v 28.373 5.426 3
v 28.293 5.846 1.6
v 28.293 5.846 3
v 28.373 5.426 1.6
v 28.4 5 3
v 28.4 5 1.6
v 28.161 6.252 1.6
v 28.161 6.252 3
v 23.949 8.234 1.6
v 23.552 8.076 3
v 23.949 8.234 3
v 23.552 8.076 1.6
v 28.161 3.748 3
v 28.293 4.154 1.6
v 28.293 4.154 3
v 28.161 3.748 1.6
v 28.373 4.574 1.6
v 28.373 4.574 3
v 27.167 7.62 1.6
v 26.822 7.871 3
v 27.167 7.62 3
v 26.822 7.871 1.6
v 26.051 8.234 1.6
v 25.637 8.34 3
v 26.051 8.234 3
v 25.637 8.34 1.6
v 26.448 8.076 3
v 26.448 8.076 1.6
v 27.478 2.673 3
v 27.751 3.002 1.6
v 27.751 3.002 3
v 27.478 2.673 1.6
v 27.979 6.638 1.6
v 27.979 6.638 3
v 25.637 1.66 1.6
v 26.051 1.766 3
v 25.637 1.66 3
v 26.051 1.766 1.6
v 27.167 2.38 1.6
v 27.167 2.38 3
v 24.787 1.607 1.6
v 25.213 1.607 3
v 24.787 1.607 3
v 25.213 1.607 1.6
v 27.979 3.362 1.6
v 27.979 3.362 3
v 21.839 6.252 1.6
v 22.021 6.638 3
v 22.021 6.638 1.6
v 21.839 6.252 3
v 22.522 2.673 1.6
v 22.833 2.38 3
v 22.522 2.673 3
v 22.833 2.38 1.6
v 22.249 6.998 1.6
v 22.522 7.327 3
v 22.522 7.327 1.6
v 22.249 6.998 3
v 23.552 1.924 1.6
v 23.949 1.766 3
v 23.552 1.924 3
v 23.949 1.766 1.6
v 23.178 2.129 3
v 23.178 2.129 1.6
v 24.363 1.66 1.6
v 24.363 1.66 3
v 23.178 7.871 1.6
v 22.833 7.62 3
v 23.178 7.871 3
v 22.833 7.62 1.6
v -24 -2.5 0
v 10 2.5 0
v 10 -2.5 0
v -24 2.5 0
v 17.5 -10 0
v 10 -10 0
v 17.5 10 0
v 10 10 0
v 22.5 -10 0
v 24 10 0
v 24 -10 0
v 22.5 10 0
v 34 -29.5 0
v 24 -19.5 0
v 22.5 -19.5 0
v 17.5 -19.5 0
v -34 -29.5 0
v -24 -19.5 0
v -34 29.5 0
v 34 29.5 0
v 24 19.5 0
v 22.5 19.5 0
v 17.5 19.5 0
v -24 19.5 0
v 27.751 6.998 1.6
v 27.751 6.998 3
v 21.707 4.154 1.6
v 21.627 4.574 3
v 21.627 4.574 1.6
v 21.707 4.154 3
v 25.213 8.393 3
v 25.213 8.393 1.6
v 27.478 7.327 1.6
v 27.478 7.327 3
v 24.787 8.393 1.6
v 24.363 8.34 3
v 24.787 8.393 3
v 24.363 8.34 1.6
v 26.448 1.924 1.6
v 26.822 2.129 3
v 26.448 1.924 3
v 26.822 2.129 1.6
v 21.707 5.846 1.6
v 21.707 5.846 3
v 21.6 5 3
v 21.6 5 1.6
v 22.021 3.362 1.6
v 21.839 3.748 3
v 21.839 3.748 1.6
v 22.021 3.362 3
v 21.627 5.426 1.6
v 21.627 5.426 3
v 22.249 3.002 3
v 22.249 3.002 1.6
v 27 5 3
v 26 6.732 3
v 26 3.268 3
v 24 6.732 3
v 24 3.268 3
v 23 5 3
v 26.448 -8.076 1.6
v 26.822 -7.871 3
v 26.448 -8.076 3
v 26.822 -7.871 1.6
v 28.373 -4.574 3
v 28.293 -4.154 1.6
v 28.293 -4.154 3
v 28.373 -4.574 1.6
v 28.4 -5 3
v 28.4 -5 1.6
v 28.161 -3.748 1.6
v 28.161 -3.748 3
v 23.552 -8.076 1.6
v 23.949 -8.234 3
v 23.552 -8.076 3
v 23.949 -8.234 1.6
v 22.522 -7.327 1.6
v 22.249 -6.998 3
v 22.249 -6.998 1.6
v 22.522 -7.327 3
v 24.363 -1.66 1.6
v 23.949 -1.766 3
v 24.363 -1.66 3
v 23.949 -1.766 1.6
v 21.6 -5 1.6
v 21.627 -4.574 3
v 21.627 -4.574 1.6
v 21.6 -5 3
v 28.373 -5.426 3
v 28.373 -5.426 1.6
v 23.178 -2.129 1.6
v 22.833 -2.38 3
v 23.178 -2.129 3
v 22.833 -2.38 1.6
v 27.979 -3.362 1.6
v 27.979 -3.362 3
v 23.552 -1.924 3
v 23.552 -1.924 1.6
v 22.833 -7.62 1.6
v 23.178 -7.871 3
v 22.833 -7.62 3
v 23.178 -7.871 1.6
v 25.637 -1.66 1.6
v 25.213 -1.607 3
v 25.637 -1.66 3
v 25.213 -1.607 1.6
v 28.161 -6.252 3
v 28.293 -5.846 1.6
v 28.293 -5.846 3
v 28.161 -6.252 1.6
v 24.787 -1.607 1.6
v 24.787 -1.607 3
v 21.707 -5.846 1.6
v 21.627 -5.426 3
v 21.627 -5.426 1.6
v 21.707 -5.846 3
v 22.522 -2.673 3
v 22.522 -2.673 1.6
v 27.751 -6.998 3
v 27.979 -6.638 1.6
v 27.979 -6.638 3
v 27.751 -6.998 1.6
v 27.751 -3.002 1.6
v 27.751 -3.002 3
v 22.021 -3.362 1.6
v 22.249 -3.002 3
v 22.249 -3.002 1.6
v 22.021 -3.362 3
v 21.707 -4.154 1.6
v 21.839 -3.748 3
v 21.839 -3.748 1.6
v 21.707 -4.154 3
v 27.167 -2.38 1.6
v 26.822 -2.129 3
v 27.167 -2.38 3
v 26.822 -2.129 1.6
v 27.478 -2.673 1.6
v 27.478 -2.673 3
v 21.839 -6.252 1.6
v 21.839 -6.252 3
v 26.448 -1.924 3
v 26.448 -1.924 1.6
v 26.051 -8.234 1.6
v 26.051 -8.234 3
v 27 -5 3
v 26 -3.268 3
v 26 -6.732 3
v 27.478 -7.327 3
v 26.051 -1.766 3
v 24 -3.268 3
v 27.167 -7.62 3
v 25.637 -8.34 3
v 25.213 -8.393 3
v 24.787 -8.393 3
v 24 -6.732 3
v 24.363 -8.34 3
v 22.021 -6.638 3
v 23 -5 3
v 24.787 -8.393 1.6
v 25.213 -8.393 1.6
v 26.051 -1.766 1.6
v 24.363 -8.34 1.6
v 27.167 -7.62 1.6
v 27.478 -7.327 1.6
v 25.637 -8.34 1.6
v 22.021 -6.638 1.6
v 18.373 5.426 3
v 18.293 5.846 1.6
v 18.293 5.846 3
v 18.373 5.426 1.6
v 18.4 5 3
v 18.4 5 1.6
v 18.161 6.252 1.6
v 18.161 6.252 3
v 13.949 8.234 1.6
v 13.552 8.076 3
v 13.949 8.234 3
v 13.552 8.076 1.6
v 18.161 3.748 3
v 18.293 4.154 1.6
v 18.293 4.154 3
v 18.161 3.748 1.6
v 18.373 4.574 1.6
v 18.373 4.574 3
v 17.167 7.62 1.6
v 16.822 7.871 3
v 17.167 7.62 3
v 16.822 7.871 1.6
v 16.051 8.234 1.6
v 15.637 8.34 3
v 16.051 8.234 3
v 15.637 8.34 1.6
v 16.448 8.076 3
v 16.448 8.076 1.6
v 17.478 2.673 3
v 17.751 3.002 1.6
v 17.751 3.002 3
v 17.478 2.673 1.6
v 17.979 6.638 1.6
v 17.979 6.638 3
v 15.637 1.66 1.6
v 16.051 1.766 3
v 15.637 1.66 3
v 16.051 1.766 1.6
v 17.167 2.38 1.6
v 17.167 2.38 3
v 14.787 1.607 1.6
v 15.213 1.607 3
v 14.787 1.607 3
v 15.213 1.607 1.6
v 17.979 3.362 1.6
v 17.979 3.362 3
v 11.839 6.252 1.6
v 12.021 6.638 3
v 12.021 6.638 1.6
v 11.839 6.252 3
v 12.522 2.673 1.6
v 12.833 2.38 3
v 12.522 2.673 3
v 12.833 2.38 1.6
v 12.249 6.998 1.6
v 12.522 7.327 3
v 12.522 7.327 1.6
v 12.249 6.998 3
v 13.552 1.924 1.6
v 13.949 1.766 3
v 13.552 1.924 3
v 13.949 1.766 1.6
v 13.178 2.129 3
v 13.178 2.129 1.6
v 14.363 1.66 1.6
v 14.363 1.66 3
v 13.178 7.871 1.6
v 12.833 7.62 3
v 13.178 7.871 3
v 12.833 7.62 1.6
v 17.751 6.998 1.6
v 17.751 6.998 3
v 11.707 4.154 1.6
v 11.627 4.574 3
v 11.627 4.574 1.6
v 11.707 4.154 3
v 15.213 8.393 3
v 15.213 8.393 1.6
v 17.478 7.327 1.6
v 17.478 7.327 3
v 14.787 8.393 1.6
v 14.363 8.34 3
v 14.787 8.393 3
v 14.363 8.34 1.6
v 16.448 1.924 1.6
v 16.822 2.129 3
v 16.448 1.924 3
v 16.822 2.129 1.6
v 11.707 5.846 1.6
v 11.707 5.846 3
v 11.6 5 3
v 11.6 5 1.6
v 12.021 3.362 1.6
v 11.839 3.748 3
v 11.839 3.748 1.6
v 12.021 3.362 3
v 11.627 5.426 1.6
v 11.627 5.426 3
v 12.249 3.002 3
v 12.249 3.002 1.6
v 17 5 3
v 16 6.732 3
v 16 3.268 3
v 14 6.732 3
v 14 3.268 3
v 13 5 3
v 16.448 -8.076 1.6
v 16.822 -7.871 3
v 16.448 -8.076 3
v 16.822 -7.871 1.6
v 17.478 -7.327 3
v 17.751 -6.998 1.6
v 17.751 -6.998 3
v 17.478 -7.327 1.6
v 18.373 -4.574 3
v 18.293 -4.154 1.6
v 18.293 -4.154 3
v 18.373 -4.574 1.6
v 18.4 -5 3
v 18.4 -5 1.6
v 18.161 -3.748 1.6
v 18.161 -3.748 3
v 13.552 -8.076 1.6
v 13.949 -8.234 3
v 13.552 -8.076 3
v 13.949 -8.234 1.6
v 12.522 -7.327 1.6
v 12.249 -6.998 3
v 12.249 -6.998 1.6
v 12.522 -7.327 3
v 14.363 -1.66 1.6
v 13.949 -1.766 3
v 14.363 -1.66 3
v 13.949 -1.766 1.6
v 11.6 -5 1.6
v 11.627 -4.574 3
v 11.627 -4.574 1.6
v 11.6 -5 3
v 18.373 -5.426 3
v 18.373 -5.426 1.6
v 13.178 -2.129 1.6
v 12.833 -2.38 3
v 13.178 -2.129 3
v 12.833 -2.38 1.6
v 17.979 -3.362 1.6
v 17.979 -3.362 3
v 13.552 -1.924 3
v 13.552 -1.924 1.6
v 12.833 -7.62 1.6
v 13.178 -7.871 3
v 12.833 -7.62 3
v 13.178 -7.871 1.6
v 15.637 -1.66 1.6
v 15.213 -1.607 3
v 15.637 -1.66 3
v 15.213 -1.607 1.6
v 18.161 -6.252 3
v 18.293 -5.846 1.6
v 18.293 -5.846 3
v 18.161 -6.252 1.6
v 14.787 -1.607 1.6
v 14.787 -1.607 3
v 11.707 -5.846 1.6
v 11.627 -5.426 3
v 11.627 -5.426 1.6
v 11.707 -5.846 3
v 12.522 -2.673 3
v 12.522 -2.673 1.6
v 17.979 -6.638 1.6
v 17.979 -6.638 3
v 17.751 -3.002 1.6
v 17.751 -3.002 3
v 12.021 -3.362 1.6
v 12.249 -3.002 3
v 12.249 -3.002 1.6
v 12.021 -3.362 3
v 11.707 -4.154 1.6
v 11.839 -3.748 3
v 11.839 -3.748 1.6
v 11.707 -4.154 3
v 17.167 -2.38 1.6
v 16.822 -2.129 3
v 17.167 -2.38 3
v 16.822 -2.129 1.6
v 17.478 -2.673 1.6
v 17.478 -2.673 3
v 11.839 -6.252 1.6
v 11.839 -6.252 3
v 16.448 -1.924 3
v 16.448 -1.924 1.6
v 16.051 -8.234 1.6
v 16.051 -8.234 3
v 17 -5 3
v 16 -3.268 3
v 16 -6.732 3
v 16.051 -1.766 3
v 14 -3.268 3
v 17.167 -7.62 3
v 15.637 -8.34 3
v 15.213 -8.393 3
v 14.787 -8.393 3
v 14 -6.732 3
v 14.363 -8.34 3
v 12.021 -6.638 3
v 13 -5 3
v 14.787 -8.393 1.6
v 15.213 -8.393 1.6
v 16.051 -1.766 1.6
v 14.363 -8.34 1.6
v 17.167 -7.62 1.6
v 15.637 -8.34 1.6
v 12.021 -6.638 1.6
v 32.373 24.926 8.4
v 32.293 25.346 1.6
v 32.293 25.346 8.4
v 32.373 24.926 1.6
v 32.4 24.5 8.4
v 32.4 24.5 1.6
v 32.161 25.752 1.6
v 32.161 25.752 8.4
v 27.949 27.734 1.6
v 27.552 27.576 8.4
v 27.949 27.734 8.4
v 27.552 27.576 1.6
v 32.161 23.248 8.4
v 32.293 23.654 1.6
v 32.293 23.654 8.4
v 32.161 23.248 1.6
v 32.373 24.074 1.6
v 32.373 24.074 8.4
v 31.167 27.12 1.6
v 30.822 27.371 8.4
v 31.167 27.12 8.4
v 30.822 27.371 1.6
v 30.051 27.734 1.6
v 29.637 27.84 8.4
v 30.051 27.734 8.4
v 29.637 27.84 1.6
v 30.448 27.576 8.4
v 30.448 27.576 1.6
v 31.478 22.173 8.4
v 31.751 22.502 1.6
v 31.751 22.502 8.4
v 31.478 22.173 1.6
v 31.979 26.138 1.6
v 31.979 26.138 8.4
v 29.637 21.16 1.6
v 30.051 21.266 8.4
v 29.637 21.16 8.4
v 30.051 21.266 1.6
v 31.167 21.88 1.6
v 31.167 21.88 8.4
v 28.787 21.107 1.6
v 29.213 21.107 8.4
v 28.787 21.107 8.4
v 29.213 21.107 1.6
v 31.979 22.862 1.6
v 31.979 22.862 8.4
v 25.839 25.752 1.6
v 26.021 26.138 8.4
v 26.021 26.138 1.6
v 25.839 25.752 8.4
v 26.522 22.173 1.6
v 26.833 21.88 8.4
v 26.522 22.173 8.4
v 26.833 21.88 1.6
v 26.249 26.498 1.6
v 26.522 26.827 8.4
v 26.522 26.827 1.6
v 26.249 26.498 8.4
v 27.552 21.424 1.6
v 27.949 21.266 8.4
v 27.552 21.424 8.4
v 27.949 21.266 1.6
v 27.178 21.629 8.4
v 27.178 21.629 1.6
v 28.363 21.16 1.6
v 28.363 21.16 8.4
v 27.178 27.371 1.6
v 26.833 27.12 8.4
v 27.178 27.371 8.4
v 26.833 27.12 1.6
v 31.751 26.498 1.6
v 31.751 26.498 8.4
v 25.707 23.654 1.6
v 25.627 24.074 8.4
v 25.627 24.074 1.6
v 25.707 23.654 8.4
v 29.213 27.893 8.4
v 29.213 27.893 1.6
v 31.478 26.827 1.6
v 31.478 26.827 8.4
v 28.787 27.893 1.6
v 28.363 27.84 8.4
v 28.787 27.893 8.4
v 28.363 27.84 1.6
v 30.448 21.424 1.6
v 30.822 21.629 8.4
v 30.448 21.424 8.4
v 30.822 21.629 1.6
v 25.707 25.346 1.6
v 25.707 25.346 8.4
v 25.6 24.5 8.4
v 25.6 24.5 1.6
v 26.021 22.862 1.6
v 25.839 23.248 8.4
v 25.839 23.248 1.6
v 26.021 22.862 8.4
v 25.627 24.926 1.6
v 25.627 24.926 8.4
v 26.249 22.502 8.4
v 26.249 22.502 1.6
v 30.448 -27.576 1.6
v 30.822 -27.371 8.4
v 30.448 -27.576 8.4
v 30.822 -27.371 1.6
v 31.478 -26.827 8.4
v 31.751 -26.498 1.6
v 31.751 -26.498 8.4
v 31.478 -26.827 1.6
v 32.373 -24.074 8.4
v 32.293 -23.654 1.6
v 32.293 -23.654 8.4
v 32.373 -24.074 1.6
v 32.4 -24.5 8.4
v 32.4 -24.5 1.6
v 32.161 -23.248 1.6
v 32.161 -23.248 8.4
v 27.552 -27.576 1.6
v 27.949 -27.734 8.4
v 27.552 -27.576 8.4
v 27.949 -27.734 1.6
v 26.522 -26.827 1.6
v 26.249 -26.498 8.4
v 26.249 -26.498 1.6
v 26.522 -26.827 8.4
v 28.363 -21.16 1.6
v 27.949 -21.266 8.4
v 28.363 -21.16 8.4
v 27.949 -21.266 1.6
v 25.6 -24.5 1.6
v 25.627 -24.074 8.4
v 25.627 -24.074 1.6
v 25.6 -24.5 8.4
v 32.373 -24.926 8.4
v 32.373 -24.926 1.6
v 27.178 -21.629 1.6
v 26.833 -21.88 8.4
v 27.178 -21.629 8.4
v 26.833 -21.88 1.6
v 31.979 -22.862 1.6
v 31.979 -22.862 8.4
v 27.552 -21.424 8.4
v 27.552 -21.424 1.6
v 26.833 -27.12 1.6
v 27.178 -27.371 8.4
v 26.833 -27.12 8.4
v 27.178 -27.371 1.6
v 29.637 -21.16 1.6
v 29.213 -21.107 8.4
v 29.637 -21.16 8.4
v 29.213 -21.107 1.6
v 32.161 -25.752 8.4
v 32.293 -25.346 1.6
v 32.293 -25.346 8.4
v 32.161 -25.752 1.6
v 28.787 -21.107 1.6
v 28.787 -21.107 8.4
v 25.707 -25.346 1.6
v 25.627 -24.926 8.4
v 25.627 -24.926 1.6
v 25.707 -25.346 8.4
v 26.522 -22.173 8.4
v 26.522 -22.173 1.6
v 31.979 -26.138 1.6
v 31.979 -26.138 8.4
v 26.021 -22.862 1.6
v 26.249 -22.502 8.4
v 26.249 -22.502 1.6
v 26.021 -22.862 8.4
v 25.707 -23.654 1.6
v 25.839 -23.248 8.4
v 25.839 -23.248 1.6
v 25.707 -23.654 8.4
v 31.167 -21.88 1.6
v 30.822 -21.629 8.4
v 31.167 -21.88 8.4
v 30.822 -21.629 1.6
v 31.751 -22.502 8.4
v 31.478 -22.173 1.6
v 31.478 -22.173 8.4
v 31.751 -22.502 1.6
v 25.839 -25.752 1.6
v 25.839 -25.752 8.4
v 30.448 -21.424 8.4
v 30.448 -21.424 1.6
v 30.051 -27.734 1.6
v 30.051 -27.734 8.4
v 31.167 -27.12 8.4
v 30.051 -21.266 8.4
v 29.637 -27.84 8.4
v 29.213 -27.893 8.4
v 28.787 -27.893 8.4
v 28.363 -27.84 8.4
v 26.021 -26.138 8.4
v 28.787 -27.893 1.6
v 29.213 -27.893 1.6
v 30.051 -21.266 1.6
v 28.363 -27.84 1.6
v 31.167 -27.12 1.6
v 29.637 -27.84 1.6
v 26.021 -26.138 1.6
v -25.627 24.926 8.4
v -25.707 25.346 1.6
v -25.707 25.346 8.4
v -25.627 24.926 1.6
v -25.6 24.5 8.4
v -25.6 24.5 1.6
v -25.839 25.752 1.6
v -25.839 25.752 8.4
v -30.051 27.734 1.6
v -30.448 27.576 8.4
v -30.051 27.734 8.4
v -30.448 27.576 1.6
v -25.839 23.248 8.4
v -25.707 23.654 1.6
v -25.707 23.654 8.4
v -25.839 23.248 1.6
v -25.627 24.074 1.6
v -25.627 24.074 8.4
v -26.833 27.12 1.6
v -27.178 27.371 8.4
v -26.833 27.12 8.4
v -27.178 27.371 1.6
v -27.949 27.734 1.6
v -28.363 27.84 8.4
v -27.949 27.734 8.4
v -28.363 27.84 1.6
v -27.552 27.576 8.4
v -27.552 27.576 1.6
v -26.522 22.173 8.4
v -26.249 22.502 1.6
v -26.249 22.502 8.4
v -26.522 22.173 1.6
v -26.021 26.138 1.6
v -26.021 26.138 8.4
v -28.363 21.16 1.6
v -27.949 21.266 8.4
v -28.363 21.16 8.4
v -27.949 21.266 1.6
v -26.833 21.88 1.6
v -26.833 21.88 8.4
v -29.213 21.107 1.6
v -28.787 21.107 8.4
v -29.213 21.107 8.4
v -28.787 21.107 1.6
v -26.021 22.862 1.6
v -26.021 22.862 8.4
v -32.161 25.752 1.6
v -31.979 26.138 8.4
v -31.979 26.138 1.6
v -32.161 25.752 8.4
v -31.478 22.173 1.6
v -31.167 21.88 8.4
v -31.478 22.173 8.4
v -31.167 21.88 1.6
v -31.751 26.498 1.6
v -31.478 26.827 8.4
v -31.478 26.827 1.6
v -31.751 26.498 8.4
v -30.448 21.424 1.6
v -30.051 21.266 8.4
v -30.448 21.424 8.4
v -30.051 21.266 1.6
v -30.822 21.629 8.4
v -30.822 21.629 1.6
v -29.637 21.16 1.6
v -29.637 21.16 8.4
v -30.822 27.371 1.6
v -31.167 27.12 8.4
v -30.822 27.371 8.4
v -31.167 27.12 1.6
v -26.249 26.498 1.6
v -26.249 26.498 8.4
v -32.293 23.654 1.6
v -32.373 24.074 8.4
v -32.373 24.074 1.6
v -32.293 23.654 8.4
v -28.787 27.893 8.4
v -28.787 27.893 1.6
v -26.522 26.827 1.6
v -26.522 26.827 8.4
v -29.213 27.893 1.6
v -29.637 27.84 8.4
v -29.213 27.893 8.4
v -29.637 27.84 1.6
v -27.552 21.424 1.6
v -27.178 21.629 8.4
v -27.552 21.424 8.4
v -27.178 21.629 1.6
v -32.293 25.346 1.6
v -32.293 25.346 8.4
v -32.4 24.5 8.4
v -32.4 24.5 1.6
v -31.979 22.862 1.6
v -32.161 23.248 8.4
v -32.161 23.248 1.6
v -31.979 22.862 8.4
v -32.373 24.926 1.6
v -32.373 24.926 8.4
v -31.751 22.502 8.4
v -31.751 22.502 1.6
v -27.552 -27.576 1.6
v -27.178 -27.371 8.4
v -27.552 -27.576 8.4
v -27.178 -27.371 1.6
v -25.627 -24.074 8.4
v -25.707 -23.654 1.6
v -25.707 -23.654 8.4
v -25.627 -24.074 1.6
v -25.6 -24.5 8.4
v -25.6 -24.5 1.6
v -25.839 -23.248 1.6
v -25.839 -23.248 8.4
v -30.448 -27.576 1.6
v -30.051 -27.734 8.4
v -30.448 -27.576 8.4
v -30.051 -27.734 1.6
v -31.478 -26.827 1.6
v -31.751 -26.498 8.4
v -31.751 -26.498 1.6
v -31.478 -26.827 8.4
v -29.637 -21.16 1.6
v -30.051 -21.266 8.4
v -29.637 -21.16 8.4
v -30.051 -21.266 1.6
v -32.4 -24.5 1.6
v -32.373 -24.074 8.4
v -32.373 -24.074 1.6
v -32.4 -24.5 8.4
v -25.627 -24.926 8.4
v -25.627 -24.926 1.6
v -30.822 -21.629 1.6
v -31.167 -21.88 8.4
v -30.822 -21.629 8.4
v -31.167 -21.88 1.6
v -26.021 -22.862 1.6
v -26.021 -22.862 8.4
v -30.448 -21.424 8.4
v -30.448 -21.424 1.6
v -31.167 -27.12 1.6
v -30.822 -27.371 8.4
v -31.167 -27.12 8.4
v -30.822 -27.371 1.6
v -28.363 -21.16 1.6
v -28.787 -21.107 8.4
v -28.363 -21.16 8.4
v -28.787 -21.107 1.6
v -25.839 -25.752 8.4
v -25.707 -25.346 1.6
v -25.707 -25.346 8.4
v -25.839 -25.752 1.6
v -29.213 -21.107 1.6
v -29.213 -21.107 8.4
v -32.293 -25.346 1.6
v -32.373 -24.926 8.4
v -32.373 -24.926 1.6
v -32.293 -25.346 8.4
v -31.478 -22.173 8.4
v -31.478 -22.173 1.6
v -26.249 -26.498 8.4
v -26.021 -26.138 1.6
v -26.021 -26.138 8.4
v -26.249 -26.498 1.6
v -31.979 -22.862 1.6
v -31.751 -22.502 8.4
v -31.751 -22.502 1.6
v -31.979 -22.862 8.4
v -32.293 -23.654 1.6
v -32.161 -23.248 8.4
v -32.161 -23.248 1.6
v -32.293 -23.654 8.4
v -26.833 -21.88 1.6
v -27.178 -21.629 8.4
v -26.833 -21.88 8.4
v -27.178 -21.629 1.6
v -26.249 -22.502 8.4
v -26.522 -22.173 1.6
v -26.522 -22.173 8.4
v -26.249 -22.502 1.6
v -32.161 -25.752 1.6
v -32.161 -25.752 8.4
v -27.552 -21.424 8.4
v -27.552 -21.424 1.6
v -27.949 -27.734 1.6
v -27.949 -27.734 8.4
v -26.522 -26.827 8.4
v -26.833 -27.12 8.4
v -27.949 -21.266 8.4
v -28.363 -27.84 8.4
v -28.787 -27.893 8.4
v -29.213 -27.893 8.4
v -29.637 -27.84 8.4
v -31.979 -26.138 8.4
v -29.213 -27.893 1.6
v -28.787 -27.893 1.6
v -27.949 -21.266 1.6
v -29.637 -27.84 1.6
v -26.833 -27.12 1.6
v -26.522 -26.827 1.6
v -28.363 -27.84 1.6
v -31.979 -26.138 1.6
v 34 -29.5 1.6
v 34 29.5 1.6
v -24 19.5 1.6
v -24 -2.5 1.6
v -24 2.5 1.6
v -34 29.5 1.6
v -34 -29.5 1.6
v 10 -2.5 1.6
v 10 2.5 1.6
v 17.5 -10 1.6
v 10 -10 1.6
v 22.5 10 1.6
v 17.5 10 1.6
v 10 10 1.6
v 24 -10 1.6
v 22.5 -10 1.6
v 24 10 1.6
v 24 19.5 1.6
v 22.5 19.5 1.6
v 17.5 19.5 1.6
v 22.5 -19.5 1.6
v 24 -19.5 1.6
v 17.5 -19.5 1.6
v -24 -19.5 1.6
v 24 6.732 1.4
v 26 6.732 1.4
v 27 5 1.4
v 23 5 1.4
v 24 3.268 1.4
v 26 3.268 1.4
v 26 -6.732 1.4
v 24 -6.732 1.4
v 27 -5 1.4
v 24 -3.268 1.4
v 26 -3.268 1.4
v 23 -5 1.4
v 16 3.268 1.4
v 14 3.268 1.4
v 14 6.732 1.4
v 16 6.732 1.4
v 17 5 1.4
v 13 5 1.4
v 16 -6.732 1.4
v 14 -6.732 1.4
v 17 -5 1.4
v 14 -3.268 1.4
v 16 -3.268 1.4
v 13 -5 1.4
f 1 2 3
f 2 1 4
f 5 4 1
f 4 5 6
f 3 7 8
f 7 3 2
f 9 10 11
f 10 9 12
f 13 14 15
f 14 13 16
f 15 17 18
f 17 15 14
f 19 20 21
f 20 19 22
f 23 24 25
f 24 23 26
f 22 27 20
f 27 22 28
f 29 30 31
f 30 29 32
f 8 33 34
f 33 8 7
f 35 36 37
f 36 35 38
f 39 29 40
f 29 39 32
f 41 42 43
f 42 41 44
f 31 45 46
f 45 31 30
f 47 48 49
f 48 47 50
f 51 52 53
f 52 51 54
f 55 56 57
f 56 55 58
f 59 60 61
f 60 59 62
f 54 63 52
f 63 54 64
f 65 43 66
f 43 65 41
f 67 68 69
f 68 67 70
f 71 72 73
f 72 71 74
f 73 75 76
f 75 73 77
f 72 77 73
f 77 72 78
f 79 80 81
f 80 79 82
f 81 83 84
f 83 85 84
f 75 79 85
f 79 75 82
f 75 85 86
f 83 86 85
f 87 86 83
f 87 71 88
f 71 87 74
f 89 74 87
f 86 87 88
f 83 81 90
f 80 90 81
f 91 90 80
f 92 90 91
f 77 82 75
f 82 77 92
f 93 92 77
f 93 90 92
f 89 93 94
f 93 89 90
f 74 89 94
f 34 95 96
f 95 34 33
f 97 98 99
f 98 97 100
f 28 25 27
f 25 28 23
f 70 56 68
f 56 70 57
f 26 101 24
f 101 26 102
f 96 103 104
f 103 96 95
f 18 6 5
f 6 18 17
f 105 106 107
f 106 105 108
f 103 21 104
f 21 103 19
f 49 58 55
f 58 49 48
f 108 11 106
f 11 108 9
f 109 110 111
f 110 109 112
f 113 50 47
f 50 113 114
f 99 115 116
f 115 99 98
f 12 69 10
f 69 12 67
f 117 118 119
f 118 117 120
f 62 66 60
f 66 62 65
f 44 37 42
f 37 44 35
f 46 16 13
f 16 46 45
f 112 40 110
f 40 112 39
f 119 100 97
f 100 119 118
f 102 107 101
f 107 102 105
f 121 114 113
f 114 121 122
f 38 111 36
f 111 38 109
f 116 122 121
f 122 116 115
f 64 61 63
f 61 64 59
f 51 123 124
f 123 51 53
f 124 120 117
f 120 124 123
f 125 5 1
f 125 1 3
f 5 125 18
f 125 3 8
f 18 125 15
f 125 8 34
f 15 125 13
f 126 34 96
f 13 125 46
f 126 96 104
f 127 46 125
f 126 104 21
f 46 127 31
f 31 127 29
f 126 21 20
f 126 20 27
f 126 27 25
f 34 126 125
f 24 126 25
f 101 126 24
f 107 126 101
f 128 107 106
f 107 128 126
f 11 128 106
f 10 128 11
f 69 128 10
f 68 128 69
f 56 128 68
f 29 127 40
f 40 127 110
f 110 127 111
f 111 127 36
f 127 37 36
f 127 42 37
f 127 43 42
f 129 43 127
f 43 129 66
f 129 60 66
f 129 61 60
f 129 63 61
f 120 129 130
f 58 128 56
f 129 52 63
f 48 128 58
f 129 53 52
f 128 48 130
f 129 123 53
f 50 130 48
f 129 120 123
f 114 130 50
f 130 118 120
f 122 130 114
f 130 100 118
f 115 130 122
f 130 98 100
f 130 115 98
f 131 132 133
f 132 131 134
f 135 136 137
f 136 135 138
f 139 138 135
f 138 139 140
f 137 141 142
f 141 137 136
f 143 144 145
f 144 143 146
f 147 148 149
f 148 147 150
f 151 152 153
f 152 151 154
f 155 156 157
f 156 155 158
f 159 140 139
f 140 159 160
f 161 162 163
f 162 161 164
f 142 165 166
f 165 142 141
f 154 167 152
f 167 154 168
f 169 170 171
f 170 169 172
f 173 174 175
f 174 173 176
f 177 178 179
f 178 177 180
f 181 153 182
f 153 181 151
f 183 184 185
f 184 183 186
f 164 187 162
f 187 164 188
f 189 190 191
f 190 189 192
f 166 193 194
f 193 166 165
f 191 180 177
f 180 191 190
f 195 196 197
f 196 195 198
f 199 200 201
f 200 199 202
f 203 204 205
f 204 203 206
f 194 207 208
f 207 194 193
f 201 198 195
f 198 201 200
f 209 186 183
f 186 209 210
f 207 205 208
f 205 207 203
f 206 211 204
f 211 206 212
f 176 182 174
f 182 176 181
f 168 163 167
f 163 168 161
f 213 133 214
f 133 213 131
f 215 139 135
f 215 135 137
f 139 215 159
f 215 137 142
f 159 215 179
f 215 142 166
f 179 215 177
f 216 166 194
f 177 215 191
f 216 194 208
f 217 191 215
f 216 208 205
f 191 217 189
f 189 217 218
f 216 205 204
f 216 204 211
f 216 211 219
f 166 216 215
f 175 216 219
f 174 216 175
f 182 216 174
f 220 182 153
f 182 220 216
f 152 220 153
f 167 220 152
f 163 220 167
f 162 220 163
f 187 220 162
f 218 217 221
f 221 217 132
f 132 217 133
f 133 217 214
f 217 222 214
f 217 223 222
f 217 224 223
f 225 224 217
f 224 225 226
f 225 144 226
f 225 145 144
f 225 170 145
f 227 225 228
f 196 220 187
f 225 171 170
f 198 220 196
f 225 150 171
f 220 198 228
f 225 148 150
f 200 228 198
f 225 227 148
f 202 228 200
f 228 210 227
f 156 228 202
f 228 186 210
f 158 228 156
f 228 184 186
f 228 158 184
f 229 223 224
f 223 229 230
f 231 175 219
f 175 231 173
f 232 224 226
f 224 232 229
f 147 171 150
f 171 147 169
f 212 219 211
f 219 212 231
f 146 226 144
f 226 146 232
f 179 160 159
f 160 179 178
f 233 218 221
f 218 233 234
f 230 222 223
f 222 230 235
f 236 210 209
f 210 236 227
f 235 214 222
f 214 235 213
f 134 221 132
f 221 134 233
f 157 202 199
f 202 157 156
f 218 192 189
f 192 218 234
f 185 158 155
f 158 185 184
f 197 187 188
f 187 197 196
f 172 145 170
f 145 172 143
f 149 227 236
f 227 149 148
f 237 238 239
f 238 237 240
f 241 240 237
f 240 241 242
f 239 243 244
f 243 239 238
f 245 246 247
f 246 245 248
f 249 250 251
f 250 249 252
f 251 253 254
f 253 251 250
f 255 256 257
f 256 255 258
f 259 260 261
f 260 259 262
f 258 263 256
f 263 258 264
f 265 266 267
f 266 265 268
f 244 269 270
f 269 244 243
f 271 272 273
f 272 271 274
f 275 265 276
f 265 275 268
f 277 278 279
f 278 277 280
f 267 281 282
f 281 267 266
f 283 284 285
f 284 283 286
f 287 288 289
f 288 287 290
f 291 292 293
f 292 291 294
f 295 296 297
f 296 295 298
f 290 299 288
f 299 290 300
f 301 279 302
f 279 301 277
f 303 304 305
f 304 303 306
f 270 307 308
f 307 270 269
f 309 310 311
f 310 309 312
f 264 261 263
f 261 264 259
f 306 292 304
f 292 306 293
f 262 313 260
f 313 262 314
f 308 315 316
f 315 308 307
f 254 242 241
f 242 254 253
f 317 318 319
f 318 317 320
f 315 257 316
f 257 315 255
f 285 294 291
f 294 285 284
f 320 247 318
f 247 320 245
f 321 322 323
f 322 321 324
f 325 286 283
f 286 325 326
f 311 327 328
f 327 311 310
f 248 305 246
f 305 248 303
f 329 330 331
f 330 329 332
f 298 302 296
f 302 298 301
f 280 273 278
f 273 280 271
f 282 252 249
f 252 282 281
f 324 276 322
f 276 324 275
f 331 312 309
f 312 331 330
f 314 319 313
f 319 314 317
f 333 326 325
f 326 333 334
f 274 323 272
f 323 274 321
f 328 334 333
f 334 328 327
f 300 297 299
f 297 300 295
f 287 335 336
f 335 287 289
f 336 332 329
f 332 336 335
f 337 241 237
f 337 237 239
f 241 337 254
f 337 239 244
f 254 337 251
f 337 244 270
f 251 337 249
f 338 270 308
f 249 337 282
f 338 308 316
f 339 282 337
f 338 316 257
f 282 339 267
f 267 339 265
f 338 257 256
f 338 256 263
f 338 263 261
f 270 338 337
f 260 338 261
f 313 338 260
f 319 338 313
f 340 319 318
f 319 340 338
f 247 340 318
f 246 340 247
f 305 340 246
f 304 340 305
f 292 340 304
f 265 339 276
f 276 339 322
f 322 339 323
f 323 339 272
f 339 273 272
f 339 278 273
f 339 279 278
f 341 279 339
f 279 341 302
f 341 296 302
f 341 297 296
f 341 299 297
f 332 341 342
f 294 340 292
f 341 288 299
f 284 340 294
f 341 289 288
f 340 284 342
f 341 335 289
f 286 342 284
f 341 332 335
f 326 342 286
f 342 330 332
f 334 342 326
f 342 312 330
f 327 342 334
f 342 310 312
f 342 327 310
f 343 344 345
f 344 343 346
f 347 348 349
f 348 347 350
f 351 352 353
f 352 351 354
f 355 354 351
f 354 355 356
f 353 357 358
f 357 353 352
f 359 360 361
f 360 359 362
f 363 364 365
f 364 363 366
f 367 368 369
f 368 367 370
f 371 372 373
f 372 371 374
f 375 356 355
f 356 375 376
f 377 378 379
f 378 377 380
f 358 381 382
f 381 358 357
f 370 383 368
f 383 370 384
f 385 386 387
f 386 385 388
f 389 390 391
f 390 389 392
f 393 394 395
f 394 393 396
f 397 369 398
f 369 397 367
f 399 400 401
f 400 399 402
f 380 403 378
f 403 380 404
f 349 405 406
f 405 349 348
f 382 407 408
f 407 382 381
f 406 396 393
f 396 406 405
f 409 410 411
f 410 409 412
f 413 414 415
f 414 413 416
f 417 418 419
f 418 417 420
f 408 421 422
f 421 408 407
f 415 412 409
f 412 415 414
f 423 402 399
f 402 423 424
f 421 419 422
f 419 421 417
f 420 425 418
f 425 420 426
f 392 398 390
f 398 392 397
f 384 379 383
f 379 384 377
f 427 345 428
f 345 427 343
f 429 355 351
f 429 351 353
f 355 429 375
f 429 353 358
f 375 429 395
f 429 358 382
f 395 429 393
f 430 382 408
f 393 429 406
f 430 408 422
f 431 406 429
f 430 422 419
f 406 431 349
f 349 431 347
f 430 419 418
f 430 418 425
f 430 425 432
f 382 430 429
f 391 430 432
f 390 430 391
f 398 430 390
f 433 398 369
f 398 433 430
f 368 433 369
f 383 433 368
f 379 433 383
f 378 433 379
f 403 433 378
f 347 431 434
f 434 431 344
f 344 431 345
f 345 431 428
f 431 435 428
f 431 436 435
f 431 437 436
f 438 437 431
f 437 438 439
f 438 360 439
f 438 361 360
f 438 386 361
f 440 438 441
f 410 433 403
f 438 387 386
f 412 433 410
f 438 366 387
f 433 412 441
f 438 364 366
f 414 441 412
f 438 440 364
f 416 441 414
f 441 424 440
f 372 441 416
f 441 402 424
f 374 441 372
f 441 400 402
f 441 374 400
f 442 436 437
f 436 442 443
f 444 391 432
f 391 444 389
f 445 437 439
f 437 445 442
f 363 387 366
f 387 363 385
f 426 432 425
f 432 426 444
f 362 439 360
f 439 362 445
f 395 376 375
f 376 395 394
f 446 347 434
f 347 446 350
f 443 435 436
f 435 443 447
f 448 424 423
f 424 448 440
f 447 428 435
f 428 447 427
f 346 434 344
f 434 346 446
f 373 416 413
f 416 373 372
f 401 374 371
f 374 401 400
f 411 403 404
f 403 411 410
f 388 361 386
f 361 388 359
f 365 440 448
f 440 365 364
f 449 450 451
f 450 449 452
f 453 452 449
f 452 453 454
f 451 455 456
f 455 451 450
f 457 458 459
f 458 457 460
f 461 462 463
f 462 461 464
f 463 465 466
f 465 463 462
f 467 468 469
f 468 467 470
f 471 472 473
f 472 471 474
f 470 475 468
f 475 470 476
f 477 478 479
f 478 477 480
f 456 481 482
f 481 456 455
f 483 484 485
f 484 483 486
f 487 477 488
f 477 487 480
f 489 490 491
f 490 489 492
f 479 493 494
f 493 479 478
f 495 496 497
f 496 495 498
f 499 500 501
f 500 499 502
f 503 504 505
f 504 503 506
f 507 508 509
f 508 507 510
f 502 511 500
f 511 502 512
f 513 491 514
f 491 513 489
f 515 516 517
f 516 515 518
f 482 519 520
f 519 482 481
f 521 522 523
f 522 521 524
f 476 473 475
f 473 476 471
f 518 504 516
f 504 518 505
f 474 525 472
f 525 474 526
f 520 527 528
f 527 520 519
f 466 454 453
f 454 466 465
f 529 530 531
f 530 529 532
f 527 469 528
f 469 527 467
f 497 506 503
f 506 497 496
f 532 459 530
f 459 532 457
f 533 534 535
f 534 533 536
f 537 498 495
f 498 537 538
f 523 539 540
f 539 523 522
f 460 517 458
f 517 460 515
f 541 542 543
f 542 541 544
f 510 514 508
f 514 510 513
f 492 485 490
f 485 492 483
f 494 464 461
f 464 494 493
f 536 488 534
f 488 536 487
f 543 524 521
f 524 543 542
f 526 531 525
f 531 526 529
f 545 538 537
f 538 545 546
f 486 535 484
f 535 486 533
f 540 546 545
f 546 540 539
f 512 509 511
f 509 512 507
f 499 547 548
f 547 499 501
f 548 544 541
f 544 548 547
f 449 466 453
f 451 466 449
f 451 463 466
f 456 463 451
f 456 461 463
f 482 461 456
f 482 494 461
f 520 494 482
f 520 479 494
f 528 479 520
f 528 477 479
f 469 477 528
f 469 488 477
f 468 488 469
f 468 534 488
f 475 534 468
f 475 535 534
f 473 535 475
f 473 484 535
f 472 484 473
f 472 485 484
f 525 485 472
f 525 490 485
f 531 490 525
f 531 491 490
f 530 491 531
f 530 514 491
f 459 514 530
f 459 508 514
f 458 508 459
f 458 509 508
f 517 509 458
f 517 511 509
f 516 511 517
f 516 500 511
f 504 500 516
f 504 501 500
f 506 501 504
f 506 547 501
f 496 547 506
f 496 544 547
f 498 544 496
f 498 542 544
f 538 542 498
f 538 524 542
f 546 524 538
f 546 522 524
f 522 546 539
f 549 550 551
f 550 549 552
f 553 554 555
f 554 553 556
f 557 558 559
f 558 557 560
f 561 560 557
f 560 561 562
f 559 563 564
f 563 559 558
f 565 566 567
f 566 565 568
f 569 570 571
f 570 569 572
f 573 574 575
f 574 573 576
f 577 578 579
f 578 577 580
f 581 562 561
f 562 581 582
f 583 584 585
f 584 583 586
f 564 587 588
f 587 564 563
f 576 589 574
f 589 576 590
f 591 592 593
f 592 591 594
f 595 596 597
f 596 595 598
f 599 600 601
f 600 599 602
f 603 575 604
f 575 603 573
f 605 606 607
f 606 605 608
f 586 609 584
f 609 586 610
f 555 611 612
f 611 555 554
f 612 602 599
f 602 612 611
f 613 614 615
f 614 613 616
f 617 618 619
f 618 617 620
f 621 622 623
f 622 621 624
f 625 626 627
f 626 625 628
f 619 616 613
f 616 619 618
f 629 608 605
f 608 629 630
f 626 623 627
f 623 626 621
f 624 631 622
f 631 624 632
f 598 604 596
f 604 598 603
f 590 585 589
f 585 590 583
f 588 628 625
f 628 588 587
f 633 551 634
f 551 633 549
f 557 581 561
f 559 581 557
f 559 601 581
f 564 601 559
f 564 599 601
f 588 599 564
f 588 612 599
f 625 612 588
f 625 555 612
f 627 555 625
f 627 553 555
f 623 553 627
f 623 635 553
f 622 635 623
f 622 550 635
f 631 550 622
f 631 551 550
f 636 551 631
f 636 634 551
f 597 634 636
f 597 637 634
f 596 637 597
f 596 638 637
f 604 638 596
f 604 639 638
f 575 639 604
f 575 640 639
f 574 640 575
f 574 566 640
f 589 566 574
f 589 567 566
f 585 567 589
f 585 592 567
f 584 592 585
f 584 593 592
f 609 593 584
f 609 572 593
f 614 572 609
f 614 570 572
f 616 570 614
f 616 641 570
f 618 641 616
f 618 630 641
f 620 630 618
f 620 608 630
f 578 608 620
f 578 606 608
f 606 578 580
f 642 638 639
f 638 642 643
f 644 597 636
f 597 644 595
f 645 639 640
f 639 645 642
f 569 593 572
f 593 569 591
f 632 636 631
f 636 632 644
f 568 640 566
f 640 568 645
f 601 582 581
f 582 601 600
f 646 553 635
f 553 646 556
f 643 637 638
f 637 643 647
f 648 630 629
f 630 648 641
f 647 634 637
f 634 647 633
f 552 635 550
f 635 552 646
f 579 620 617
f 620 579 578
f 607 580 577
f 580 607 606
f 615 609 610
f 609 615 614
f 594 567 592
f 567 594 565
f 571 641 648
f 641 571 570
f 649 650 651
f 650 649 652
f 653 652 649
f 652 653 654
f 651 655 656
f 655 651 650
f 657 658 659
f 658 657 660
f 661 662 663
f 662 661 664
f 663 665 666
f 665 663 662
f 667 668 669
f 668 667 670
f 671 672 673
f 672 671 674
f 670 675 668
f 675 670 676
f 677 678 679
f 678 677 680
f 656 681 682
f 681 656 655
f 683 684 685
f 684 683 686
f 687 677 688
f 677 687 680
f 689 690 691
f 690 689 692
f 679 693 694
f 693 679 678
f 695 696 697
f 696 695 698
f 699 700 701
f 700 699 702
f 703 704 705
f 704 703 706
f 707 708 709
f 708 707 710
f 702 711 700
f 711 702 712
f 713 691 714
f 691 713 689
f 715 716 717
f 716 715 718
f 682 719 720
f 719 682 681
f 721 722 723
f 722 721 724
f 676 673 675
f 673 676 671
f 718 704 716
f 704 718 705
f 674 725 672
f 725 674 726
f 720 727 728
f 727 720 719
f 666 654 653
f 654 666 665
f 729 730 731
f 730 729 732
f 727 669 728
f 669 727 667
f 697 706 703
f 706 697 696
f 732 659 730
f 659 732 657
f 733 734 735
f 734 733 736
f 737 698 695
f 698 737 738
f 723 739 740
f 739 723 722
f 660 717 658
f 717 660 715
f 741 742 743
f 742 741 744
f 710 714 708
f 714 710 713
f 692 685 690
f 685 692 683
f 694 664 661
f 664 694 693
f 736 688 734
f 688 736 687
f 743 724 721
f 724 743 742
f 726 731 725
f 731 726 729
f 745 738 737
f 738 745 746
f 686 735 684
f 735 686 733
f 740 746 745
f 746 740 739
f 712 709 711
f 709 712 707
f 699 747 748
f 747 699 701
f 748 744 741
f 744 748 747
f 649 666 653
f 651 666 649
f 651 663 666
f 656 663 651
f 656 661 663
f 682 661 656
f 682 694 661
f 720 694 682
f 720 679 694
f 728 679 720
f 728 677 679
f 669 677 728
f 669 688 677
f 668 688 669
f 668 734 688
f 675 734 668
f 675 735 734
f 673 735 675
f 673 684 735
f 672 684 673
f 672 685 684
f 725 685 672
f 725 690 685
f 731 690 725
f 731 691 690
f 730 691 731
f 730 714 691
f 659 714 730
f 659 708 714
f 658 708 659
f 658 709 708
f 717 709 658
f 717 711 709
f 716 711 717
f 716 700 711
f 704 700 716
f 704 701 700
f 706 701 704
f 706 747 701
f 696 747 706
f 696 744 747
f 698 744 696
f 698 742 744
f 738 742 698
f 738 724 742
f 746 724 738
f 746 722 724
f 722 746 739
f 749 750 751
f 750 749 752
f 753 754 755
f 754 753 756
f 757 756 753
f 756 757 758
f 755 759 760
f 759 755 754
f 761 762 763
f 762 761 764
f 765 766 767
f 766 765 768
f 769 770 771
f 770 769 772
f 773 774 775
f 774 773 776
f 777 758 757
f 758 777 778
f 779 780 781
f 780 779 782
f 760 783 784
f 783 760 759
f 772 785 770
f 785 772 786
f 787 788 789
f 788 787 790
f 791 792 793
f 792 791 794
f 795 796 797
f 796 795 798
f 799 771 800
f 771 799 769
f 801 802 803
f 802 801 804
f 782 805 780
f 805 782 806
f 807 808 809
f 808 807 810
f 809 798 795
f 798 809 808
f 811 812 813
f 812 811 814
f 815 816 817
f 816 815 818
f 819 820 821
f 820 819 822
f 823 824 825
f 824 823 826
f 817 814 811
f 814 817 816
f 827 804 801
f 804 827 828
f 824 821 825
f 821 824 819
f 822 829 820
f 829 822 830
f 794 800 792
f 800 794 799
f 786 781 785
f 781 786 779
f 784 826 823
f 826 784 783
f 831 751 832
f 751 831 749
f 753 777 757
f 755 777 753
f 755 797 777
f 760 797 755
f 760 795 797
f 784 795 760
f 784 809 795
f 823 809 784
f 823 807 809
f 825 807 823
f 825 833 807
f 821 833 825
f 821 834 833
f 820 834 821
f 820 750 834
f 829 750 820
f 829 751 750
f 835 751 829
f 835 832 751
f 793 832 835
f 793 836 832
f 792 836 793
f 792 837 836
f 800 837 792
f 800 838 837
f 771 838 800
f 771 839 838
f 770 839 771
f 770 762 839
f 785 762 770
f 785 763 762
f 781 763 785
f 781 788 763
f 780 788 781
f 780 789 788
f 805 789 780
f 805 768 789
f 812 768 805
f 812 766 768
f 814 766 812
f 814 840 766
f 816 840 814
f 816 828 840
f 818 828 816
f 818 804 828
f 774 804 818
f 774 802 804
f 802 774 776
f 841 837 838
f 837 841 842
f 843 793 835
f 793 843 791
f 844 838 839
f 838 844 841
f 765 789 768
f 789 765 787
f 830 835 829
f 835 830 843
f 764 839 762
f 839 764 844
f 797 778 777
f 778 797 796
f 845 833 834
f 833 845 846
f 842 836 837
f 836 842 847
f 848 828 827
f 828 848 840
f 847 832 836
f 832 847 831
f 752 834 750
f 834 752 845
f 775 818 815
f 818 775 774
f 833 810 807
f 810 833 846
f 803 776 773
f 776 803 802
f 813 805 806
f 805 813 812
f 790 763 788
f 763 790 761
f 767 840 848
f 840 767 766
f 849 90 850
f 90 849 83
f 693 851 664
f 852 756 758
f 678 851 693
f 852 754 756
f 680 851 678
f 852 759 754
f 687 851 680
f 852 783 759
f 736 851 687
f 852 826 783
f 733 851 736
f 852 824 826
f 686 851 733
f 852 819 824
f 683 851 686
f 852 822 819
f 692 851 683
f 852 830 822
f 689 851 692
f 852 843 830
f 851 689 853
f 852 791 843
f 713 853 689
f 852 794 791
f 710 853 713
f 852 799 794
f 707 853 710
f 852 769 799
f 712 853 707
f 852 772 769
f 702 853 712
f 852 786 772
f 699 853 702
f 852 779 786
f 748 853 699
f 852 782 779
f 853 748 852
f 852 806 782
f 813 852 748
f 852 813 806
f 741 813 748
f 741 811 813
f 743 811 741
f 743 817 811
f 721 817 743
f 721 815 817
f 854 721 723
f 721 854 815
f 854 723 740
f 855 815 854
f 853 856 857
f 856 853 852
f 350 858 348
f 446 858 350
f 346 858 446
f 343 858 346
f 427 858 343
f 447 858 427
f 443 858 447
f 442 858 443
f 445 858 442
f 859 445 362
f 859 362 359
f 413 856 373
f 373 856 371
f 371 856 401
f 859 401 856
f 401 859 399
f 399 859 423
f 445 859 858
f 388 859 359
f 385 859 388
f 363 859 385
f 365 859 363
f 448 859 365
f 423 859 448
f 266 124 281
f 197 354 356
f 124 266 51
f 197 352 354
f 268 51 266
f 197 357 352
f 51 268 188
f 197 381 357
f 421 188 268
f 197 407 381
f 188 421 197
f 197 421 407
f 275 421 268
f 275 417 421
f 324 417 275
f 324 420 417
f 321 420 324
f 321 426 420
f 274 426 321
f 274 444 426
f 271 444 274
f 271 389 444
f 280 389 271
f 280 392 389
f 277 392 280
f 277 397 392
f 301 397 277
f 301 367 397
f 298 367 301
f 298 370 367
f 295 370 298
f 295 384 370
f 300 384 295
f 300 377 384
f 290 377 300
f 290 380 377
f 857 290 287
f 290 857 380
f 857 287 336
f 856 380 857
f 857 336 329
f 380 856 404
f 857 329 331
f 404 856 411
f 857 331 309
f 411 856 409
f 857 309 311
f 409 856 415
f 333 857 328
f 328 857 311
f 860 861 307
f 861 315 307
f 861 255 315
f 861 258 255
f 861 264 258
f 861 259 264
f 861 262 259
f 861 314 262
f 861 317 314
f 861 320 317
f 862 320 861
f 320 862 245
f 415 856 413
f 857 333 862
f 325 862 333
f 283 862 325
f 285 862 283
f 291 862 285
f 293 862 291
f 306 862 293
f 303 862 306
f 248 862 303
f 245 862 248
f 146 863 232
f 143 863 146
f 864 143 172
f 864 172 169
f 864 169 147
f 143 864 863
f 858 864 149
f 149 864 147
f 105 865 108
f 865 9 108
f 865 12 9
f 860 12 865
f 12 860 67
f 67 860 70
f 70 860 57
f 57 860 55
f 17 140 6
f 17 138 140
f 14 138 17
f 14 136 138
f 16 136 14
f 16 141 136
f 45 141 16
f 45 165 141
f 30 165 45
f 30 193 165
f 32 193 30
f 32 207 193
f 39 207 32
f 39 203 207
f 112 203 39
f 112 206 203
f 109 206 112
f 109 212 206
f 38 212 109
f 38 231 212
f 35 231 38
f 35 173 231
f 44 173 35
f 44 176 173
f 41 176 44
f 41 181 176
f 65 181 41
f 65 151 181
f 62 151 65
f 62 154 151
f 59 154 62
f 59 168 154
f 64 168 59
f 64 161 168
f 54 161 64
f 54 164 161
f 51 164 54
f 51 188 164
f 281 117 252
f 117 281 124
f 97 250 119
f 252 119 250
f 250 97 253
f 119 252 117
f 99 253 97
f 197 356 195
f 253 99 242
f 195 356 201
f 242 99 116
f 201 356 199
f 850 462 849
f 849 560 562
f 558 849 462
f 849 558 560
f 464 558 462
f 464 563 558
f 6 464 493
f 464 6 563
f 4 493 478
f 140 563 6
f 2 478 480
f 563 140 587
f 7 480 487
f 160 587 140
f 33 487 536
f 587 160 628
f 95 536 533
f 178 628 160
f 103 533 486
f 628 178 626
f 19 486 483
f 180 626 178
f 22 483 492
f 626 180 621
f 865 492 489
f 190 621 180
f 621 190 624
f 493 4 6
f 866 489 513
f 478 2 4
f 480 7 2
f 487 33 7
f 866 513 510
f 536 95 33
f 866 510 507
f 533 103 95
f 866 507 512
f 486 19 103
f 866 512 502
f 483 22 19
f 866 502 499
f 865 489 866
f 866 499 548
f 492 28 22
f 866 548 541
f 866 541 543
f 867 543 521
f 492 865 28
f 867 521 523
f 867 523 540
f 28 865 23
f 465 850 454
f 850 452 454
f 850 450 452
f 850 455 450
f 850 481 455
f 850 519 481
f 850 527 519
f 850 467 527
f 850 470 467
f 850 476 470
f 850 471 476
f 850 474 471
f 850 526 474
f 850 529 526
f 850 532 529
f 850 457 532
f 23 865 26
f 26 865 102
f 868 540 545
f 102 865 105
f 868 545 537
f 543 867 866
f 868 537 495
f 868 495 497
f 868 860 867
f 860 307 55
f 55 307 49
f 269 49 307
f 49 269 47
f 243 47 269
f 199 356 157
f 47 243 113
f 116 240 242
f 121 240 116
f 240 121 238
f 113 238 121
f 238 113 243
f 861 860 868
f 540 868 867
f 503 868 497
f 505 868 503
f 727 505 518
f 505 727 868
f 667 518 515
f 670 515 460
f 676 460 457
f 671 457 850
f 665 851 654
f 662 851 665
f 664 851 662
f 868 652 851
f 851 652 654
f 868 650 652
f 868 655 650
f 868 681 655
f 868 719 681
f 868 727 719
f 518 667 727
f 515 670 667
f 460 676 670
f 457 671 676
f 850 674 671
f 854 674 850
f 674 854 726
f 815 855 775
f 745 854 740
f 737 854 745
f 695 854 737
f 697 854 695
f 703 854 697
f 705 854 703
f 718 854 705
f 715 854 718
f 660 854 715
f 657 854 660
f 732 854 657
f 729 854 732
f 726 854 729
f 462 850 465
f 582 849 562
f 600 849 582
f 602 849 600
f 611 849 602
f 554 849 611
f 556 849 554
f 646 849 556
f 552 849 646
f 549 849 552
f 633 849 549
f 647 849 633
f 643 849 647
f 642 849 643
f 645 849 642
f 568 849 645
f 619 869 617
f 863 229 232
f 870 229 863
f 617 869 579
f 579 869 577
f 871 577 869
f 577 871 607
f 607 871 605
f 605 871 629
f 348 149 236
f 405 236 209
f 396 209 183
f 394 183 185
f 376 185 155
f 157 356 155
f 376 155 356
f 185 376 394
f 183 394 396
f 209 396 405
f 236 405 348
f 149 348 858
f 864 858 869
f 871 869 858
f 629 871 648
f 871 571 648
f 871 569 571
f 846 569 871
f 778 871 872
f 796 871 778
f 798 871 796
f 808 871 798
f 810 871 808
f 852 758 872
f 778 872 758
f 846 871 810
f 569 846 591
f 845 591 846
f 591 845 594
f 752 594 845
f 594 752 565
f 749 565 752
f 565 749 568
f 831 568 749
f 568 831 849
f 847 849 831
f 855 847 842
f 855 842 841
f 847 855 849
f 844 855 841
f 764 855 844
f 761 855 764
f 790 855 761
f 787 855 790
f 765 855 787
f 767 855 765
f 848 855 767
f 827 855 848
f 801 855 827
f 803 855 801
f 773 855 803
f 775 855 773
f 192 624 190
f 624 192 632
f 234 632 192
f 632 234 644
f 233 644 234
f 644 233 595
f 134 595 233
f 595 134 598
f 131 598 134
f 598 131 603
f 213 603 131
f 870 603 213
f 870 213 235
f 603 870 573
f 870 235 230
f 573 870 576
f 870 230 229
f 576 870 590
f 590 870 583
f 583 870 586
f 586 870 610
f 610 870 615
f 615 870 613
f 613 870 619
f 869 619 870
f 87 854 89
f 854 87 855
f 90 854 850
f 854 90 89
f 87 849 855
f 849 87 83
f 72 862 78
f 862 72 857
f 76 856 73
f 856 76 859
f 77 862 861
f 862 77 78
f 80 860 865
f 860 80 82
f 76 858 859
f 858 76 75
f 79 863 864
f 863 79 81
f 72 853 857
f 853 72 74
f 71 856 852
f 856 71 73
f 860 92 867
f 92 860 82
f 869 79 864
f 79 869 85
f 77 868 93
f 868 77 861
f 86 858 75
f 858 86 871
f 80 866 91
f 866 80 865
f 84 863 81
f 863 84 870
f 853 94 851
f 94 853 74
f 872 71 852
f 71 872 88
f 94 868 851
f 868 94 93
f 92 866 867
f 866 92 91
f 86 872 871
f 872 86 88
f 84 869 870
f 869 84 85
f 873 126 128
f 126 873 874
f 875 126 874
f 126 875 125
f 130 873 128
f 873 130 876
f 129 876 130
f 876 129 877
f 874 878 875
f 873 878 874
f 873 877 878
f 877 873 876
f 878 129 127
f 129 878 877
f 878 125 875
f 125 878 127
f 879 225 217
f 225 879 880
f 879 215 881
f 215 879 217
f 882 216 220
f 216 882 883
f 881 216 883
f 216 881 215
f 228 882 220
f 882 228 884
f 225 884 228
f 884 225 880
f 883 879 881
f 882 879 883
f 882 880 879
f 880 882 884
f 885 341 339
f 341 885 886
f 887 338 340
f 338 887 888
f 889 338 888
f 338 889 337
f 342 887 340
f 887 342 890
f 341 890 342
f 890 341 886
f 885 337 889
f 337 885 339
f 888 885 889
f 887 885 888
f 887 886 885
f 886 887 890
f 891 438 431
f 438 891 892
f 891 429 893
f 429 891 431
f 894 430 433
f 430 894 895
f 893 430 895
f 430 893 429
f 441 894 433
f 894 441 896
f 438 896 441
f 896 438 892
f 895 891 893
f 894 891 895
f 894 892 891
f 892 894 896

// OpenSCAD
// file: configuration/general.scad
//Screw standards
SCREW_STANDARD_M3=3;
NUT_HEIGHT_M3=2.5;

//HDMI screen cover
HDMI_HOLES_LENGTH=157;
HDMI_HOLES_WIDTH=108;
GAP_MAINSCREWS_HDMI=3;
BASE_OUTERPAD_HDMI=2;
FRONT_COVER_TRAPS_TOLERANCE=0.1;

//PILLARS
PILLARS_HEIGHT=50;
PILLARS_THICKNESS=10;

//Side plates
SIDE_HOLES_DIST=80;
SIDE_HOLES_GAP=20;
                    
//Back plate
BACK_PLATE_CENTER_BLOB=8;
BACK_PLATE_WALL=5;
BACK_PLATE_WALL_INNER=2.5;
BACK_PLATE_THICKNESS=9;
SCREW_BLOCK_SIZE=12;
BACK_PLATE_SENSORBOARD_X=40;
BACK_PLATE_SENSORBOARD_Y=10;
BACK_PLATE_RPI_BOARD_X=-50;
BACK_PLATE_RPI_BOARD_Y=10;
BACK_PLATE_ADAPTER0_THICKNESS=3;
BACK_PLATE_ADAPTER0_SPACING=100;
BACK_PLATE_SENSORBOARD_X=40;
BACK_PLATE_SENSORBOARD_Y=10;
BACK_PLATE_RPI_BOARD_X=-50;
BACK_PLATE_RPI_BOARD_Y=-10;

//Top panels
TOP_PANEL_DIST=50;
TOP_PANEL_GAP=25;

//Adapter0
CIRCUIT_BOARD_SCREWSTANDARD0=2;
CIRCUIT_BOARD_ADAPTER0_SPACING=10;
CIRCUIT_BOARD_ADAPTER0_SCREW_HEIGHT=6-BACK_PLATE_ADAPTER0_THICKNESS;
CIRCUIT_BOARD_ADAPTER0_SCREW_TRAP_HEIGHT=1.6;
CIRCUIT_BOARD_ADAPTER0_PLUS_WIDTH=5;
CIRCUIT_BOARD_ADAPTER0_BASE_WIDTH=CIRCUIT_BOARD_ADAPTER0_SPACING+10;
// file: utils/hex_trap.scad
module hex_hole(h_trap,h_hole,r_trap,r_hole,rot)
{
    rotate([rot,0,0]) {
translate([0,0,h_hole])
{
	cylinder(h = h_trap, r = r_trap, $fn = 6);
}

	cylinder(h = h_hole, r = r_hole, $fn = 20);

}
}
/*
width=18;
length=60;
h_hole=2;
h_trap=4;
r_trap=3;
r_hole=2;
spacer=4;
explode=false;
if (explode)
{
cube(size = [width,length,h_hole+h_trap], center = false);
translate([0,0,10]){
hex_hole(h_trap,h_hole,r_trap,r_hole,width/2,4,0);
hex_hole(h_trap,h_hole,r_trap+1,r_hole,width/2,12,0);
hex_hole(h_trap,h_hole,r_trap+2,r_hole,width/2,22,0);
hex_hole(h_trap,h_hole,r_trap+3,r_hole,width/2,33,0);}
}
else
{
difference() {
cube(size = [width,length,h_hole+h_trap], center = false);
hex_hole(h_trap,h_hole,r_trap-0.5,r_hole,width/2,5,0);
hex_hole(h_trap,h_hole,r_trap,r_hole,width/2,13,0);
hex_hole(h_trap,h_hole,r_trap+1,r_hole,width/2,23,0);
hex_hole(h_trap,h_hole,r_trap+2,r_hole,width/2,36,0);
hex_hole(h_trap,h_hole,r_trap+3,r_hole,width/2,50,0);
}
}

*/
// file: utils/circuit_plate.scad
include <hex_trap.scad>;
include <../configuration/general.scad>;


module traps(base_height,base_hole_height,offset_x)
{
translate([base_length/2,base_width/2,base_height])
hex_hole(base_trap_height,base_hole_height,CIRCUIT_BOARD_SCREWSTANDARD0,180);
translate([base_length/2,-base_width/2,base_height])
hex_hole(base_trap_height,base_hole_height,CIRCUIT_BOARD_SCREWSTANDARD0,180);
translate([-base_length/2,base_width/2,base_height])
hex_hole(base_trap_height,base_hole_height,CIRCUIT_BOARD_SCREWSTANDARD0,180);
translate([-base_length/2,-base_width/2,base_height])
hex_hole(base_trap_height,base_hole_height,CIRCUIT_BOARD_SCREWSTANDARD0,180);
    translate([offset_x,0,0]){
translate([CIRCUIT_BOARD_ADAPTER0_SPACING/2,CIRCUIT_BOARD_ADAPTER0_SPACING/2,0])
hex_hole(CIRCUIT_BOARD_ADAPTER0_SCREW_TRAP_HEIGHT,CIRCUIT_BOARD_ADAPTER0_SCREW_HEIGHT - CIRCUIT_BOARD_ADAPTER0_SCREW_TRAP_HEIGHT,CIRCUIT_BOARD_SCREWSTANDARD0,0);
translate([CIRCUIT_BOARD_ADAPTER0_SPACING/2,-CIRCUIT_BOARD_ADAPTER0_SPACING/2,0])
hex_hole(CIRCUIT_BOARD_ADAPTER0_SCREW_TRAP_HEIGHT,CIRCUIT_BOARD_ADAPTER0_SCREW_HEIGHT - CIRCUIT_BOARD_ADAPTER0_SCREW_TRAP_HEIGHT,CIRCUIT_BOARD_SCREWSTANDARD0,0);
translate([-CIRCUIT_BOARD_ADAPTER0_SPACING/2,CIRCUIT_BOARD_ADAPTER0_SPACING/2,0])
hex_hole(CIRCUIT_BOARD_ADAPTER0_SCREW_TRAP_HEIGHT,CIRCUIT_BOARD_ADAPTER0_SCREW_HEIGHT - CIRCUIT_BOARD_ADAPTER0_SCREW_TRAP_HEIGHT,CIRCUIT_BOARD_SCREWSTANDARD0,0);
translate([-CIRCUIT_BOARD_ADAPTER0_SPACING/2,-CIRCUIT_BOARD_ADAPTER0_SPACING/2,0])
hex_hole(CIRCUIT_BOARD_ADAPTER0_SCREW_TRAP_HEIGHT,CIRCUIT_BOARD_ADAPTER0_SCREW_HEIGHT - CIRCUIT_BOARD_ADAPTER0_SCREW_TRAP_HEIGHT,CIRCUIT_BOARD_SCREWSTANDARD0,0);}
}
module pillars(base_height,offset_x)
{
    translate([base_length/2,base_width/2,0])
cylinder(r=CIRCUIT_BOARD_SCREWSTANDARD0*1.7,h=base_height,$fn=50);
    translate([base_length/2,-base_width/2,0])
cylinder(r=CIRCUIT_BOARD_SCREWSTANDARD0*1.7,h=base_height,$fn=50);
    translate([-base_length/2,base_width/2,0])
cylinder(r=CIRCUIT_BOARD_SCREWSTANDARD0*1.7,h=base_height,$fn=50);
    translate([-base_length/2,-base_width/2,0])
cylinder(r=CIRCUIT_BOARD_SCREWSTANDARD0*1.7,h=base_height,$fn=50);
    translate([offset_x,0,0]){
    translate([CIRCUIT_BOARD_ADAPTER0_SPACING/2,CIRCUIT_BOARD_ADAPTER0_SPACING/2,0])
cylinder(r=CIRCUIT_BOARD_SCREWSTANDARD0*1.7,h=CIRCUIT_BOARD_ADAPTER0_SCREW_HEIGHT,$fn=50);
    translate([CIRCUIT_BOARD_ADAPTER0_SPACING/2,-CIRCUIT_BOARD_ADAPTER0_SPACING/2,0])
cylinder(r=CIRCUIT_BOARD_SCREWSTANDARD0*1.7,h=CIRCUIT_BOARD_ADAPTER0_SCREW_HEIGHT,$fn=50);
    translate([-CIRCUIT_BOARD_ADAPTER0_SPACING/2,CIRCUIT_BOARD_ADAPTER0_SPACING/2,0])
cylinder(r=CIRCUIT_BOARD_SCREWSTANDARD0*1.7,h=CIRCUIT_BOARD_ADAPTER0_SCREW_HEIGHT,$fn=50);
    translate([-CIRCUIT_BOARD_ADAPTER0_SPACING/2,-CIRCUIT_BOARD_ADAPTER0_SPACING/2,0])
cylinder(r=CIRCUIT_BOARD_SCREWSTANDARD0*1.7,h=CIRCUIT_BOARD_ADAPTER0_SCREW_HEIGHT,$fn=50);
    }
}
module box()
{
    
    translate([-base_length/2-base_padding,-base_width/2-base_padding,0])
    cube(size=[base_length+base_padding*2,base_width+base_padding*2,base_trap_height],center=false);
}
module extrusions(offset_x)
{

    difference(){
        translate([-base_length/2+base_padding,-base_width/2+base_padding,0])
        cube(size=[base_length-base_padding*2,base_width-base_padding*2,base_trap_height],center=false);
        union(){
            translate([-CIRCUIT_BOARD_ADAPTER0_SPACING/2-base_padding+offset_x,-CIRCUIT_BOARD_ADAPTER0_SPACING/2-base_padding,0])
            cube(size=[CIRCUIT_BOARD_ADAPTER0_SPACING+base_padding*2,CIRCUIT_BOARD_ADAPTER0_SPACING+base_padding*2,base_trap_height],center=false);
            translate([-base_length/2-base_padding,-CIRCUIT_BOARD_ADAPTER0_PLUS_WIDTH/2,0])
            cube(size=[base_length+base_padding*2,CIRCUIT_BOARD_ADAPTER0_PLUS_WIDTH,base_trap_height],center=false);
            translate([-base_length/2-base_padding,-CIRCUIT_BOARD_ADAPTER0_PLUS_WIDTH/2,0])
            cube(size=[base_length+base_padding*2,CIRCUIT_BOARD_ADAPTER0_PLUS_WIDTH,base_trap_height],center=false);
            translate([-CIRCUIT_BOARD_ADAPTER0_PLUS_WIDTH/2+offset_x,-base_width/2-base_padding,0])
            cube(size=[CIRCUIT_BOARD_ADAPTER0_PLUS_WIDTH,base_width+base_padding*2,base_trap_height],center=false);
        }
    }
}
module circuit_plate(base_length,base_width,base_padding,pcb_thickness,base_trap_height,screw_height)
{
circuit_plate_offset_adapter(base_length,base_width,base_padding,pcb_thickness,base_trap_height,screw_height,0,0);
}
module circuit_plate_offset_adapter(base_length,base_width,base_padding,pcb_thickness,base_trap_height,screw_height,offset_x,offset_y)
{
base_height=screw_height-pcb_thickness;    
base_hole_height=base_height-base_trap_height;

difference(){
    union(){
        box();
        pillars(base_height,offset_x);
        }
    union(){    
        extrusions(offset_x);
        traps(base_height,base_hole_height,offset_x);
    }
}
}
// main file
include <utils/circuit_plate.scad>;
base_length=58;
base_width=49;
base_padding=5;
pcb_thickness=1.6;
screw_height=10;
base_trap_height=1.6;
circuit_plate_offset_adapter(base_length,base_width,base_padding,pcb_thickness,base_trap_height,screw_height,20,0);
